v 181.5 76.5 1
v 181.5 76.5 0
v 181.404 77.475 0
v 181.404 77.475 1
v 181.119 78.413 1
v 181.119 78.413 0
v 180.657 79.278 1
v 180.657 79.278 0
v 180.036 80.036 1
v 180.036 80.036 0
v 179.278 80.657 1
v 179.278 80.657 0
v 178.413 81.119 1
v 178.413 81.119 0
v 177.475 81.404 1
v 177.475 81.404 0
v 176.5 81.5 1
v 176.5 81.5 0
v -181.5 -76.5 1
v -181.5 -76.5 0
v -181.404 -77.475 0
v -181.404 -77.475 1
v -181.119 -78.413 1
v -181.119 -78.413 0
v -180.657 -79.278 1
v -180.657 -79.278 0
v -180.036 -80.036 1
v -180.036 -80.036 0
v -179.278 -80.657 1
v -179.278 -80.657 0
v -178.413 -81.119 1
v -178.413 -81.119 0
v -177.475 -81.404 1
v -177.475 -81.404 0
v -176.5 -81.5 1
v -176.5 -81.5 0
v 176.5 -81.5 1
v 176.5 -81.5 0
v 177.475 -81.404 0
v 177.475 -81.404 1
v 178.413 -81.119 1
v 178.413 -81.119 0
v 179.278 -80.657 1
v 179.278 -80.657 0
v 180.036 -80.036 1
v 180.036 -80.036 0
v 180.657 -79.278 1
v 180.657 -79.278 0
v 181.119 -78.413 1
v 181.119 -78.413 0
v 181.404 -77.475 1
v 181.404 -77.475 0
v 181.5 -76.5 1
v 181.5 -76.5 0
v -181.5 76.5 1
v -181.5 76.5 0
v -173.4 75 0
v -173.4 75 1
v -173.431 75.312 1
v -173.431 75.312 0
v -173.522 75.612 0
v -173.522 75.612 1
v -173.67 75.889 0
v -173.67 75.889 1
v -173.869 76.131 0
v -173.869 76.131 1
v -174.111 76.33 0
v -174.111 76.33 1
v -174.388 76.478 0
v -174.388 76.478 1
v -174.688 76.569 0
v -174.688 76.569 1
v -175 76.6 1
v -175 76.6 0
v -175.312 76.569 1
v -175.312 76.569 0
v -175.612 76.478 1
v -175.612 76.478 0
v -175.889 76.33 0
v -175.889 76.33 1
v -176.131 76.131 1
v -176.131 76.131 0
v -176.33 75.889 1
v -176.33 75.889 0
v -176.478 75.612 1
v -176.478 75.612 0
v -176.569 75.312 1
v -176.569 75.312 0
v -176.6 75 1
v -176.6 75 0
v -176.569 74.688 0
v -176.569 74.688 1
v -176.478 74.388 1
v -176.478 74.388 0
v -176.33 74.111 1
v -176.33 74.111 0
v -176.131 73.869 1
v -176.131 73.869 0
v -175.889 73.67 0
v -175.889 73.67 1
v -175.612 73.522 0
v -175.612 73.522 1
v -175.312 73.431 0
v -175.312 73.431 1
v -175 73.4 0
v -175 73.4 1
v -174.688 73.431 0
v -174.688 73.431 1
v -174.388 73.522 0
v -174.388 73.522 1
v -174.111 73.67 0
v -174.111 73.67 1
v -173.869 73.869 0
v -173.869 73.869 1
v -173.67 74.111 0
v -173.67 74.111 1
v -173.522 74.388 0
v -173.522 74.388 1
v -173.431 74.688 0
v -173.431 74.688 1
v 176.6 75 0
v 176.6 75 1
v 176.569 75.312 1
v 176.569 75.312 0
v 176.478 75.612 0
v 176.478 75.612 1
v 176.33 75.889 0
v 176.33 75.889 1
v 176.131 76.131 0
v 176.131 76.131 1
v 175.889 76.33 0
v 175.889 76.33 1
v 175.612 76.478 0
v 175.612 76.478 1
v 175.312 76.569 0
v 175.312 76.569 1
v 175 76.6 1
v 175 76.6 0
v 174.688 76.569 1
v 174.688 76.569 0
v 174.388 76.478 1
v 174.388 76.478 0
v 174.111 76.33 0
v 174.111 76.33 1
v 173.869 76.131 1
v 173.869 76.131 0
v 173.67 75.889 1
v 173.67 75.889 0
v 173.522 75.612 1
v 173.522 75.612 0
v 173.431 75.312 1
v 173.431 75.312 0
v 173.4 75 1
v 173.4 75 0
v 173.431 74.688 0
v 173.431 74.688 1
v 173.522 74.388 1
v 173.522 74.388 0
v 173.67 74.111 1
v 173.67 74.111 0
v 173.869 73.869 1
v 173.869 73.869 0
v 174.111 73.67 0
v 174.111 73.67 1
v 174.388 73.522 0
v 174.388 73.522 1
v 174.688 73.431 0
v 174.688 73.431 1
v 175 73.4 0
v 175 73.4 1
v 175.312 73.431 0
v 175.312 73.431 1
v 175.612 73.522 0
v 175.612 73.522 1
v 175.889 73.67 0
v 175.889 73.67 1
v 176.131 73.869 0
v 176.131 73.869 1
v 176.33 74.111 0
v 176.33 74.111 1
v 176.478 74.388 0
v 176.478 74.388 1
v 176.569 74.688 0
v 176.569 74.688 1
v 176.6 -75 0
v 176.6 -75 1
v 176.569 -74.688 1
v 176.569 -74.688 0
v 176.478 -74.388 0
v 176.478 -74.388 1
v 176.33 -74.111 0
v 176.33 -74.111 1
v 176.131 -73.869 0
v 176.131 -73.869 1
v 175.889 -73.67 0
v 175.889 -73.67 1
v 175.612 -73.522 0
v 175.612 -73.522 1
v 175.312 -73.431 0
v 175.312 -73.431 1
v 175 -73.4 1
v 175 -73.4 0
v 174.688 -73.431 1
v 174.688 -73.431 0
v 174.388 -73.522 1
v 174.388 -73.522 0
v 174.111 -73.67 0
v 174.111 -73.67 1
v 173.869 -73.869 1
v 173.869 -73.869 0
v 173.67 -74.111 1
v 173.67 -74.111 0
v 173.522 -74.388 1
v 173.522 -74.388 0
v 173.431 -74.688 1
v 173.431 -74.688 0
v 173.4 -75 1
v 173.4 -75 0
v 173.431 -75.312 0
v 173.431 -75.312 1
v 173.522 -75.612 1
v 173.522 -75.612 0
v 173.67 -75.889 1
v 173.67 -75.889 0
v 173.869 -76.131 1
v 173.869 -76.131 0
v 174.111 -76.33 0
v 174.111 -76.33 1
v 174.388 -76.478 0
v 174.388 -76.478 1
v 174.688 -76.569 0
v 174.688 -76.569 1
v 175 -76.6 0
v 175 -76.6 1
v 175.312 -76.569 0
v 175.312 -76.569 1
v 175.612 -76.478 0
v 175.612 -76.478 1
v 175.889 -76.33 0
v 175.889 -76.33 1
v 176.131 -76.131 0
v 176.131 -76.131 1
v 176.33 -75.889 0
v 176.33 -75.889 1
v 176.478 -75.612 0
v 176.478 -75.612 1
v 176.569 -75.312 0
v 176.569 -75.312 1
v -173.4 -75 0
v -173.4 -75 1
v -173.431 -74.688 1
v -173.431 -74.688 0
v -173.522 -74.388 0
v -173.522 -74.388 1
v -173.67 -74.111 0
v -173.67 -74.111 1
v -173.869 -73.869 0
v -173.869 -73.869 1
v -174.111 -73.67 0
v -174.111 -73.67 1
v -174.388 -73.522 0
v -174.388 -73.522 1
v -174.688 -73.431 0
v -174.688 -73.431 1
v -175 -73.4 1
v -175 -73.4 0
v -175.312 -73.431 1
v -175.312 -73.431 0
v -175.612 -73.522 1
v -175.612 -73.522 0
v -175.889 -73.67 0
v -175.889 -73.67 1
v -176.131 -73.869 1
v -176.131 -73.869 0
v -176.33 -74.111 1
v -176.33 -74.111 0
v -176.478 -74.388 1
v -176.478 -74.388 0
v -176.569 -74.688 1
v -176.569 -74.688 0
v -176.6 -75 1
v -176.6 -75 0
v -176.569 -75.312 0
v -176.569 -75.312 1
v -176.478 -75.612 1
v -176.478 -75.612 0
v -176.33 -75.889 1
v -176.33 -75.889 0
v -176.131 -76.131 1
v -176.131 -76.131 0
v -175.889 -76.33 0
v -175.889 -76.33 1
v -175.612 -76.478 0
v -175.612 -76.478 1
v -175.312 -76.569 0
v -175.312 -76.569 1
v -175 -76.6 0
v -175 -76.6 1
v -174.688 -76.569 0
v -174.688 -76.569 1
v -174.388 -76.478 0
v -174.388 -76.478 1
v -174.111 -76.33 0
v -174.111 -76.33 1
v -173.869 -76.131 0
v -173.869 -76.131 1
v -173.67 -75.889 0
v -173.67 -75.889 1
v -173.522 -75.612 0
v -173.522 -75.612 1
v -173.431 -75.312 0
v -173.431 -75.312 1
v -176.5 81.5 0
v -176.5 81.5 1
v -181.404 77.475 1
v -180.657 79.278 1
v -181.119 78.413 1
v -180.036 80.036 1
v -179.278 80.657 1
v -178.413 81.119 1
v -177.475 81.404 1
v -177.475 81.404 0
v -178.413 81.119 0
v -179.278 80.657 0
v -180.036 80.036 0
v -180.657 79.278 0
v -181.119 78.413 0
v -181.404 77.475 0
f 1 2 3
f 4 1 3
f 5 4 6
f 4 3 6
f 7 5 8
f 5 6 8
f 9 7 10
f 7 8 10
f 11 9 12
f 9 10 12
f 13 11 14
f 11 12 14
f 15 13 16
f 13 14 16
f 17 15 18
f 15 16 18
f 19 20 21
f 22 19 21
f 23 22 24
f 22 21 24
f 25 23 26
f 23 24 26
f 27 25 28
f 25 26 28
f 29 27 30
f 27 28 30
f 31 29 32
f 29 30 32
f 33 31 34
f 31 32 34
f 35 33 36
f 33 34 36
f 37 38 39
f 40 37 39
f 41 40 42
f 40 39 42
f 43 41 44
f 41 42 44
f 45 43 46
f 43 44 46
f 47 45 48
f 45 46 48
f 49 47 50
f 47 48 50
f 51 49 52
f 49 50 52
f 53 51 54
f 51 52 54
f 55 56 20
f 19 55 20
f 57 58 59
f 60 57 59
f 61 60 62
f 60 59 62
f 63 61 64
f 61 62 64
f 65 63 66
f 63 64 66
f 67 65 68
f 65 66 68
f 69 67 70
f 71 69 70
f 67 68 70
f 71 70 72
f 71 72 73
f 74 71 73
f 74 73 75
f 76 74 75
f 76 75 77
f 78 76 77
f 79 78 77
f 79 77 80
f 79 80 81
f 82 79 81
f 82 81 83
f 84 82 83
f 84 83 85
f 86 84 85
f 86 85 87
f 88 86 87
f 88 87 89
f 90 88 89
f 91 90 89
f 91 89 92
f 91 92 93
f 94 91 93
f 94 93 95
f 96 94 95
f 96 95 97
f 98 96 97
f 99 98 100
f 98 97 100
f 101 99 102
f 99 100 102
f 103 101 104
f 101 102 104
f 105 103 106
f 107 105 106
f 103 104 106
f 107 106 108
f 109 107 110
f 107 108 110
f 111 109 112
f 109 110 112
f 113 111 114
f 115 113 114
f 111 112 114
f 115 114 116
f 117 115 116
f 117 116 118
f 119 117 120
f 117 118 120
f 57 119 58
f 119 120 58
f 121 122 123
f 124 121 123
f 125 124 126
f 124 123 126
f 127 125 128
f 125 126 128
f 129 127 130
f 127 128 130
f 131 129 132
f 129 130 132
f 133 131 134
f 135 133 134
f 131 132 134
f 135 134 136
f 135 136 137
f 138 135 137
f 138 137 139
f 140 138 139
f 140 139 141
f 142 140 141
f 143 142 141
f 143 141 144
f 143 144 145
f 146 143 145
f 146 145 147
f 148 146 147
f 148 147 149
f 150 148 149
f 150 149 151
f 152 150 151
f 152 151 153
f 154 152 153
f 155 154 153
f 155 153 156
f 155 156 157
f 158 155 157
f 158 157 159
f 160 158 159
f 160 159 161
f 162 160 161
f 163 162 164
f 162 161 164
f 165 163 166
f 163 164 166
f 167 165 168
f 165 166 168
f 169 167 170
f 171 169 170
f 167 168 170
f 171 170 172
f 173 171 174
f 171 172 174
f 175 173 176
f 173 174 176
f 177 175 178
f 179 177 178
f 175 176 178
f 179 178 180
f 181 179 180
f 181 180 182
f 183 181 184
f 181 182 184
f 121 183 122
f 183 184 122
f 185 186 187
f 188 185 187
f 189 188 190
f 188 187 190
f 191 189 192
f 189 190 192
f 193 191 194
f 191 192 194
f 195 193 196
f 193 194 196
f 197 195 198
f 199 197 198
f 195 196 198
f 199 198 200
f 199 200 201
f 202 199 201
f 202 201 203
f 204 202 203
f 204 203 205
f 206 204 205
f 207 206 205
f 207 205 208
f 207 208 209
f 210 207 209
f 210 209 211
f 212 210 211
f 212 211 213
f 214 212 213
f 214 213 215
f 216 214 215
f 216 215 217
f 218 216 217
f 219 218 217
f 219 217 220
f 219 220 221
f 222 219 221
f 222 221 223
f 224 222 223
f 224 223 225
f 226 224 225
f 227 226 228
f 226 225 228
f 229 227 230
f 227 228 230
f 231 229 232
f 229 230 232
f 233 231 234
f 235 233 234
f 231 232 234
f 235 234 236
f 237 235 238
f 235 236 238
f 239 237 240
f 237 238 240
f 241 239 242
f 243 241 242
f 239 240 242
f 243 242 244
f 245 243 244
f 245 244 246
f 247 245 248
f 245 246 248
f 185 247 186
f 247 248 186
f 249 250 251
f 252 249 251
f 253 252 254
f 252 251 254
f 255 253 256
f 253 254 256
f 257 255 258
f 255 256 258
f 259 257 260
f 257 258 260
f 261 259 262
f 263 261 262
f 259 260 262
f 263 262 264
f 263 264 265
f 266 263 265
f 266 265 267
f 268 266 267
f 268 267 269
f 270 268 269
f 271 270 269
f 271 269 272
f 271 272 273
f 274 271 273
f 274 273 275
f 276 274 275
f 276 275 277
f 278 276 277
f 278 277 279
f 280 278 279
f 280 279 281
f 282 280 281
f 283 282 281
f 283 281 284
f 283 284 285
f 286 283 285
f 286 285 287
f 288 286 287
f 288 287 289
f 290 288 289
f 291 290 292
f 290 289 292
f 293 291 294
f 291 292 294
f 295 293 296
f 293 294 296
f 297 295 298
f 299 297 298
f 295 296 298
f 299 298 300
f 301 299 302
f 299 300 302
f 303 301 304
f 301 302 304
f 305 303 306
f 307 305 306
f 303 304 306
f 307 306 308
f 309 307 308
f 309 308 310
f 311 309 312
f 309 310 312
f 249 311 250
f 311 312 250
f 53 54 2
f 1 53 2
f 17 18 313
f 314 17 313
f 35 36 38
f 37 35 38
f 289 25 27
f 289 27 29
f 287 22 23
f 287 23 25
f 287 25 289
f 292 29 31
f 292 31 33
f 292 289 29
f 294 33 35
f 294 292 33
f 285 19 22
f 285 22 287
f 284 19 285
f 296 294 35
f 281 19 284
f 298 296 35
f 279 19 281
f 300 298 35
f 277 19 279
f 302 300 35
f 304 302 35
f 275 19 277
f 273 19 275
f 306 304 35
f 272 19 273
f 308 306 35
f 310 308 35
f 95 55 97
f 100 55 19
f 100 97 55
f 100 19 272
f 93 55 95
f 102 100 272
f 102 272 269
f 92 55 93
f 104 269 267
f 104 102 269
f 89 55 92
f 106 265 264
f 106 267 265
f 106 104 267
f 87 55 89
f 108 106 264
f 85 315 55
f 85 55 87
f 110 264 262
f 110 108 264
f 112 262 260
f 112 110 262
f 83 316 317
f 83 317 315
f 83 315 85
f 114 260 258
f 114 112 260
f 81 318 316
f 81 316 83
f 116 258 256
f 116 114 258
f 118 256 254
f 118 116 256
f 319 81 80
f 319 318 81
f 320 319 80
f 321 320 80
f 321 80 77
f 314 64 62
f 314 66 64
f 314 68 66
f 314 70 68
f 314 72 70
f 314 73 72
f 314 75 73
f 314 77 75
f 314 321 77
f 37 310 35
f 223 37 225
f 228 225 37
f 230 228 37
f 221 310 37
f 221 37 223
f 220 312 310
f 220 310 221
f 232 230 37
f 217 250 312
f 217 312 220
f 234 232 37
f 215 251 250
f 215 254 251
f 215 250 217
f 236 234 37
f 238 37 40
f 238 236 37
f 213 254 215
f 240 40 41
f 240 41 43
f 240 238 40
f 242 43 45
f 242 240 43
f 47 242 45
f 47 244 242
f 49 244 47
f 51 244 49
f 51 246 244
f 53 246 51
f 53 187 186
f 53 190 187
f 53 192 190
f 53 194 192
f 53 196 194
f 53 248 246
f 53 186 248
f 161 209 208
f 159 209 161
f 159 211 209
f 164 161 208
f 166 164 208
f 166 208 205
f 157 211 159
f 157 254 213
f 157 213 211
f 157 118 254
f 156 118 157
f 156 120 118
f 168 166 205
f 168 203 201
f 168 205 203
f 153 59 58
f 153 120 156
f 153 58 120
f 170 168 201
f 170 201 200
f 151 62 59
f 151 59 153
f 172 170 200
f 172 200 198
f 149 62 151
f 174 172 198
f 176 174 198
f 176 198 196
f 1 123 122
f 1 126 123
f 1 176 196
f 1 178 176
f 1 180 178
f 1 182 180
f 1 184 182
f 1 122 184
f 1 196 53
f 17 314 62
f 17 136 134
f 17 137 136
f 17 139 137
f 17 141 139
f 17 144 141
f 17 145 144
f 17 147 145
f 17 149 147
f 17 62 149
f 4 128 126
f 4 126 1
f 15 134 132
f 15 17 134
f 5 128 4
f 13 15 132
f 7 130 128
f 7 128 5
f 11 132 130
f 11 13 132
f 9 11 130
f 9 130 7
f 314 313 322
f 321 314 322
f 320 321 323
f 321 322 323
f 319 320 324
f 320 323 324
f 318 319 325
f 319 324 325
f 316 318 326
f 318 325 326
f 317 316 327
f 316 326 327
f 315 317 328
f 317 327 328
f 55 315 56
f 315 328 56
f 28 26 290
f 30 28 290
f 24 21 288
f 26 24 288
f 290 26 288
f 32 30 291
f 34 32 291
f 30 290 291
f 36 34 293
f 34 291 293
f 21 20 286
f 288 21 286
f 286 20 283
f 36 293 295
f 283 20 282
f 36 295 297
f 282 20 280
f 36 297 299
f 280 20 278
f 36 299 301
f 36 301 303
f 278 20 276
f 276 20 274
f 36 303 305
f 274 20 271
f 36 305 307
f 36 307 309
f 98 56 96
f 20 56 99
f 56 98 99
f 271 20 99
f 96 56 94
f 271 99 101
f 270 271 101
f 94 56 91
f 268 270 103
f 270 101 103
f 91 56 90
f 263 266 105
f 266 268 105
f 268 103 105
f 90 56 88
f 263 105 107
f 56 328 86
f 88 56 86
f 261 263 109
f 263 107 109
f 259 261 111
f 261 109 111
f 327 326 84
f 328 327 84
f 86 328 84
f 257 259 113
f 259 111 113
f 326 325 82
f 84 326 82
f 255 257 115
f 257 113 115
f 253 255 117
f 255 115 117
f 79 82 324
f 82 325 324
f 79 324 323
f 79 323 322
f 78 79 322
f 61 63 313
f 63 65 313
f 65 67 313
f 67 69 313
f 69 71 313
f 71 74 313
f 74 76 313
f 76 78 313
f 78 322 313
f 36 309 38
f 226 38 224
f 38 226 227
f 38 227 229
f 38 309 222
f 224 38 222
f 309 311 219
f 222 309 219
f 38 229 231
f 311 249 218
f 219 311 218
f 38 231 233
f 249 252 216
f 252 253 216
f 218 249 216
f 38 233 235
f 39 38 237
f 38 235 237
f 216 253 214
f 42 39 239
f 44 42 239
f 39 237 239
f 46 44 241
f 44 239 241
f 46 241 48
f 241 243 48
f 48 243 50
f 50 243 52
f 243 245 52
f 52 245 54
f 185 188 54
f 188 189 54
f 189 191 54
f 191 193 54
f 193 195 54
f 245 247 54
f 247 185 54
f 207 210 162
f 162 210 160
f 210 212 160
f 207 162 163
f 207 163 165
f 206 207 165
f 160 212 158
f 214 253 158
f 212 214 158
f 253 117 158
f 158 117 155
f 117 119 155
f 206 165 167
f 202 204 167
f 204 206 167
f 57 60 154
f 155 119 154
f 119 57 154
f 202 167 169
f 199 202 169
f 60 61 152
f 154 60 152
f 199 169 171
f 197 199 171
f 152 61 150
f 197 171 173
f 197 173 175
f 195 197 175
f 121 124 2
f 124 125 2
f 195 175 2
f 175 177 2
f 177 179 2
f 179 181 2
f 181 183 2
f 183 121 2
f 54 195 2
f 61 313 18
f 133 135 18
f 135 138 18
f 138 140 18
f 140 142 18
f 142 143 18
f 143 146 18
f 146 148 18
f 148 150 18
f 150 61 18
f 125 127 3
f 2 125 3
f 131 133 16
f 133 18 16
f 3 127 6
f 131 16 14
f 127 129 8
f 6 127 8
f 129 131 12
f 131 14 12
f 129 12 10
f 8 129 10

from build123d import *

# Parameters (mm, degrees)
PAD_DEPTH       = 1
SKETCH001_R     = 1.6
POCKET_DEPTH    = 10
SKETCH004_R     = 1.6
POCKET001_DEPTH = 5
SKETCH002_R     = 1.6
POCKET002_DEPTH = 5
SKETCH003_R     = 1.6
POCKET003_DEPTH = 5


with BuildPart() as part:
    # Sketch → Pad (new body)
    with BuildSketch(Plane.XY):
        with BuildLine():
            Line((-181.5, 76.5), (-181.5, -76.5))
            ThreePointArc((-181.5, -76.5), (-180.035534, -80.035534), (-176.5, -81.5))
            Line((-176.5, -81.5), (176.5, -81.5))
            ThreePointArc((176.5, -81.5), (180.035534, -80.035534), (181.5, -76.5))
            Line((181.5, -76.5), (181.5, 76.5))
            ThreePointArc((181.5, 76.5), (180.035534, 80.035534), (176.5, 81.5))
            Line((176.5, 81.5), (-176.5, 81.5))
            ThreePointArc((-176.5, 81.5), (-180.035534, 80.035534), (-181.5, 76.5))
        make_face()
    extrude(amount=PAD_DEPTH)

    # Sketch001 → Pocket (cut)
    with BuildSketch(Plane.XY.offset(2)):
        with Locations((-175, 75)):
            Circle(SKETCH001_R)
    extrude(amount=-POCKET_DEPTH, mode=Mode.SUBTRACT)

    # Sketch004 → Pocket001 (cut)
    with BuildSketch(Plane.XY.offset(2)):
        with Locations((175, -75)):
            Circle(SKETCH004_R)
    extrude(amount=-POCKET001_DEPTH, mode=Mode.SUBTRACT)

    # Sketch002 → Pocket002 (cut)
    with BuildSketch(Plane.XY.offset(2)):
        with Locations((-175, -75)):
            Circle(SKETCH002_R)
    extrude(amount=-POCKET002_DEPTH, mode=Mode.SUBTRACT)

    # Sketch003 → Pocket003 (cut)
    with BuildSketch(Plane.XY.offset(2)):
        with Locations((175, 75)):
            Circle(SKETCH003_R)
    extrude(amount=-POCKET003_DEPTH, mode=Mode.SUBTRACT)


solid = part.part
